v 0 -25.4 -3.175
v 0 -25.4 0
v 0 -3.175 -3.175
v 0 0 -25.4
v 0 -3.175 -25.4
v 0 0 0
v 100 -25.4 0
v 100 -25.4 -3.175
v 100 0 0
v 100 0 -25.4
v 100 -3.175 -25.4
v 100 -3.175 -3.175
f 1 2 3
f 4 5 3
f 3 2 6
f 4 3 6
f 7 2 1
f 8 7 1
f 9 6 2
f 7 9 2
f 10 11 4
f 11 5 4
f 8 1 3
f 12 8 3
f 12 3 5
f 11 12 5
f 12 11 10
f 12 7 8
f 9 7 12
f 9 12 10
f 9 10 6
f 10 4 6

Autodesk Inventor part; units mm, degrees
ref_plane "YZ Plane" through (0, 0, 0) normal (1, 0, 0) x (0, 1, 0)
ref_plane "XZ Plane" through (0, 0, 0) normal (0, 1, 0) x (-1, 0, 0)
ref_plane "XY Plane" through (0, 0, 0) normal (0, 0, 1) x (1, 0, 0)
sketch "Sketch1" plane through (0, 0, 0) normal (1, 0, 0) x (0, 1, 0)
  line L0 (0, 0) -> (-25.4, 0)
  line L1 (-25.4, 0) -> (-25.4, -3.175)
  line L2 (-25.4, -3.175) -> (0, -3.175)
  line L3 (0, -3.175) -> (0, 0)
  line L4 (0, 0) -> (-3.175, 0)
  line L5 (-3.175, 0) -> (-3.175, -25.4)
  line L6 (-3.175, -25.4) -> (0, -25.4)
  line L7 (0, -25.4) -> (0, 0)
  point P0 (-3.175, -3.175)
  dimension "d0" = 3.175
  dimension "d1" = 25.4
extrude "Extrusion1" add sketch "Sketch1" along normal blind 100
properties part number "SOPORTE_CANALETA_PRINCIPAL" material "Steel, Mild, Welded"
